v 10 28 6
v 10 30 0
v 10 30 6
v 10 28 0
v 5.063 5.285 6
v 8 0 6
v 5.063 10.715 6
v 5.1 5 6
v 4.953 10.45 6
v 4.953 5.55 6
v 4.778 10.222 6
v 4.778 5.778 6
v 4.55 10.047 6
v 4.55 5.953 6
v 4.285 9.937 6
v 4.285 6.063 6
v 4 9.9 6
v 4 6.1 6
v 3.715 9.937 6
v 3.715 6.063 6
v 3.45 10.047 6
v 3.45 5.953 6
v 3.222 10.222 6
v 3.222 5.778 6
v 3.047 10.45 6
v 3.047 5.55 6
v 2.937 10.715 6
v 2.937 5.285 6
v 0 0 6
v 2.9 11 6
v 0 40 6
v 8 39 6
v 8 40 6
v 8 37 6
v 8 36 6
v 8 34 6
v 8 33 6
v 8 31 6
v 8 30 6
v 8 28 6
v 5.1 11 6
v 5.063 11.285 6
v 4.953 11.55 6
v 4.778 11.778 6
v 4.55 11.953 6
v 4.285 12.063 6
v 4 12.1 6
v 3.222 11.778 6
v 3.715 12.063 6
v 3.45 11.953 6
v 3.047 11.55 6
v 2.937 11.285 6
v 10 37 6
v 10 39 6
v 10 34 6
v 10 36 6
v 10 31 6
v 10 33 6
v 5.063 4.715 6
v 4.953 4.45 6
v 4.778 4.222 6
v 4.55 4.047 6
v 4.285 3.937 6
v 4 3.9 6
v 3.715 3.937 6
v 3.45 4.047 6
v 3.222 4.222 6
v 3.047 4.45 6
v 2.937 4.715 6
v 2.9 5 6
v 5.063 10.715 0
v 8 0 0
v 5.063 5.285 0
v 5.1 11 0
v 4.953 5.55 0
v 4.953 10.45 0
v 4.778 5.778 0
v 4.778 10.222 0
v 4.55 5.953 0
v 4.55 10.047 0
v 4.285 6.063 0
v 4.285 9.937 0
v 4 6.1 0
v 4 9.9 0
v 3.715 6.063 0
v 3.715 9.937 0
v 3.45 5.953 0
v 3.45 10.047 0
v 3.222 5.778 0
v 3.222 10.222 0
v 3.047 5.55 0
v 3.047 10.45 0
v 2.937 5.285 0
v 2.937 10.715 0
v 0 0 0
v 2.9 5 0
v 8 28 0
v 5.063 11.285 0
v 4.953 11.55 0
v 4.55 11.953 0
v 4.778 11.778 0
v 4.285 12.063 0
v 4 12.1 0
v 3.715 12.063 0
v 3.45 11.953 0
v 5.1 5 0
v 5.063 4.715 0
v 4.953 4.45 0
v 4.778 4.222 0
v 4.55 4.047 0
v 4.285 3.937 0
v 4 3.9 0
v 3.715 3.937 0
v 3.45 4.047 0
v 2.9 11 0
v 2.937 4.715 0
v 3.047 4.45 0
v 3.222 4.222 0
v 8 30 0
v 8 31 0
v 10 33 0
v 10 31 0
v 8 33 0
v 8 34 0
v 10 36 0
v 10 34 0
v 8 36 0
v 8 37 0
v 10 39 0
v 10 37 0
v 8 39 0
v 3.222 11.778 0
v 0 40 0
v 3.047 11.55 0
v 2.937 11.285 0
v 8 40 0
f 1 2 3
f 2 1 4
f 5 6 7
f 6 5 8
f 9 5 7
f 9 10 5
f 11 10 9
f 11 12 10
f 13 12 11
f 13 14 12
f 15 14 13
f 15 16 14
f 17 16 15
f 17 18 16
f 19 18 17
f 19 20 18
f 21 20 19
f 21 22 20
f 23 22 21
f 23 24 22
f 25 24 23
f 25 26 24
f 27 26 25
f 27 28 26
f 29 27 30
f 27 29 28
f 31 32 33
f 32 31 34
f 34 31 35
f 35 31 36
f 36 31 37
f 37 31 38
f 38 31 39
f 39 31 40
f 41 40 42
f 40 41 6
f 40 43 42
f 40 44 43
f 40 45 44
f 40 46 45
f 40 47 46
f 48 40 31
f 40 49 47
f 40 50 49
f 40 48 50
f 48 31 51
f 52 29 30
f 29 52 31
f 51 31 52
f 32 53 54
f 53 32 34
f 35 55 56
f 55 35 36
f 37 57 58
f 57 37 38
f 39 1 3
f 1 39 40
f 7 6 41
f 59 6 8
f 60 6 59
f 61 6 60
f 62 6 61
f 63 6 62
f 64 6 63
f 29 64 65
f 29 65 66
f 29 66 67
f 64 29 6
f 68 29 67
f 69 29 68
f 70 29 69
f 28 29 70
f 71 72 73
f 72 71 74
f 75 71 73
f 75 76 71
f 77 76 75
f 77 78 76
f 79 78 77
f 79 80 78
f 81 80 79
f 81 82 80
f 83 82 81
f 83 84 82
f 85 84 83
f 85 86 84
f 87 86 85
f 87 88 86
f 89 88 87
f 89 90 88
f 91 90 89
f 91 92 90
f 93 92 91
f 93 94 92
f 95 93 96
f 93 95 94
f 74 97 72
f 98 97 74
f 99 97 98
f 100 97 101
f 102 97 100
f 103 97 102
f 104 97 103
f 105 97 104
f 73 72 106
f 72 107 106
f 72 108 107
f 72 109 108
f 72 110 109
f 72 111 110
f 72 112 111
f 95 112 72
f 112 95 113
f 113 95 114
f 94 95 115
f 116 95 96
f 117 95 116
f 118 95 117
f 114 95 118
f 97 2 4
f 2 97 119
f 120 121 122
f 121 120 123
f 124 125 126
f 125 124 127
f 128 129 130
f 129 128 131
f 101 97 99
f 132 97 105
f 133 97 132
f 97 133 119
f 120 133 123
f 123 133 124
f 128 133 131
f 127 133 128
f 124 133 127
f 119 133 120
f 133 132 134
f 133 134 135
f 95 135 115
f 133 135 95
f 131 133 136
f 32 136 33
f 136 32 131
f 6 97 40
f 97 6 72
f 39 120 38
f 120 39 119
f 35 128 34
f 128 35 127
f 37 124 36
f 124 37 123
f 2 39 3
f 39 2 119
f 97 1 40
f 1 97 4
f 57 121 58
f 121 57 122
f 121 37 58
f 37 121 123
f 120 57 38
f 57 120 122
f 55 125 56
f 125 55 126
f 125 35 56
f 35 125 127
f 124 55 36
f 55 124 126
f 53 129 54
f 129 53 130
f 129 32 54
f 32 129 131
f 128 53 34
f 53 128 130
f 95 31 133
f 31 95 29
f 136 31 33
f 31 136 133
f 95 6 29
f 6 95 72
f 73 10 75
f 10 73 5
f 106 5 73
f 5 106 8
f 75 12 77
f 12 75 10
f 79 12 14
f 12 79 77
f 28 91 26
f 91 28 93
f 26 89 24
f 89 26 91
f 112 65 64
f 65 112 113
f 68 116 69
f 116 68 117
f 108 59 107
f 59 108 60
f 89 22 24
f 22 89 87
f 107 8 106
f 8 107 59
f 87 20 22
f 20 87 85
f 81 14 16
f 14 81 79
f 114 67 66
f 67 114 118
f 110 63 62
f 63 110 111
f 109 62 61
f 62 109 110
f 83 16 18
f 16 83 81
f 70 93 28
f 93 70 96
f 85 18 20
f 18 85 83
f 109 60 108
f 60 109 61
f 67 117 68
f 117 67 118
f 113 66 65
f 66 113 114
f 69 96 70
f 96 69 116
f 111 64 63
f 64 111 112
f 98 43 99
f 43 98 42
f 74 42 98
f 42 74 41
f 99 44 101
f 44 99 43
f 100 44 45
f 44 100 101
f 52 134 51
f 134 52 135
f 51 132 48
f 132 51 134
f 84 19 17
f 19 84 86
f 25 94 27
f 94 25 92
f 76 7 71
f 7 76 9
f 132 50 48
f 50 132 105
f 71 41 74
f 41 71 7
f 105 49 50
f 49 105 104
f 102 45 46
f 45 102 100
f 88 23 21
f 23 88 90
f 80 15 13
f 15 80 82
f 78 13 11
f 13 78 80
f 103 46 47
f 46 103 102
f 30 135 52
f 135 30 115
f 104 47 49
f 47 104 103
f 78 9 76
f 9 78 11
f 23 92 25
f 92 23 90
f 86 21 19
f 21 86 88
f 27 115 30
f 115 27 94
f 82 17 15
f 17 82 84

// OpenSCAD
// Dit de la pinca del brac (x2, un per banda). Es cargola al casquet del servo.
difference() {
    union() {
        cube([8, 40, 6]);                          // dit
        for (i = [0 : 3]) translate([8, 28 + i * 3, 0]) cube([2, 2, 6]); // dents
    }
    translate([4, 5, -1]) cylinder(h = 8, d = 2.2, $fn = 24);  // cargols del casquet
    translate([4, 11, -1]) cylinder(h = 8, d = 2.2, $fn = 24);
}
